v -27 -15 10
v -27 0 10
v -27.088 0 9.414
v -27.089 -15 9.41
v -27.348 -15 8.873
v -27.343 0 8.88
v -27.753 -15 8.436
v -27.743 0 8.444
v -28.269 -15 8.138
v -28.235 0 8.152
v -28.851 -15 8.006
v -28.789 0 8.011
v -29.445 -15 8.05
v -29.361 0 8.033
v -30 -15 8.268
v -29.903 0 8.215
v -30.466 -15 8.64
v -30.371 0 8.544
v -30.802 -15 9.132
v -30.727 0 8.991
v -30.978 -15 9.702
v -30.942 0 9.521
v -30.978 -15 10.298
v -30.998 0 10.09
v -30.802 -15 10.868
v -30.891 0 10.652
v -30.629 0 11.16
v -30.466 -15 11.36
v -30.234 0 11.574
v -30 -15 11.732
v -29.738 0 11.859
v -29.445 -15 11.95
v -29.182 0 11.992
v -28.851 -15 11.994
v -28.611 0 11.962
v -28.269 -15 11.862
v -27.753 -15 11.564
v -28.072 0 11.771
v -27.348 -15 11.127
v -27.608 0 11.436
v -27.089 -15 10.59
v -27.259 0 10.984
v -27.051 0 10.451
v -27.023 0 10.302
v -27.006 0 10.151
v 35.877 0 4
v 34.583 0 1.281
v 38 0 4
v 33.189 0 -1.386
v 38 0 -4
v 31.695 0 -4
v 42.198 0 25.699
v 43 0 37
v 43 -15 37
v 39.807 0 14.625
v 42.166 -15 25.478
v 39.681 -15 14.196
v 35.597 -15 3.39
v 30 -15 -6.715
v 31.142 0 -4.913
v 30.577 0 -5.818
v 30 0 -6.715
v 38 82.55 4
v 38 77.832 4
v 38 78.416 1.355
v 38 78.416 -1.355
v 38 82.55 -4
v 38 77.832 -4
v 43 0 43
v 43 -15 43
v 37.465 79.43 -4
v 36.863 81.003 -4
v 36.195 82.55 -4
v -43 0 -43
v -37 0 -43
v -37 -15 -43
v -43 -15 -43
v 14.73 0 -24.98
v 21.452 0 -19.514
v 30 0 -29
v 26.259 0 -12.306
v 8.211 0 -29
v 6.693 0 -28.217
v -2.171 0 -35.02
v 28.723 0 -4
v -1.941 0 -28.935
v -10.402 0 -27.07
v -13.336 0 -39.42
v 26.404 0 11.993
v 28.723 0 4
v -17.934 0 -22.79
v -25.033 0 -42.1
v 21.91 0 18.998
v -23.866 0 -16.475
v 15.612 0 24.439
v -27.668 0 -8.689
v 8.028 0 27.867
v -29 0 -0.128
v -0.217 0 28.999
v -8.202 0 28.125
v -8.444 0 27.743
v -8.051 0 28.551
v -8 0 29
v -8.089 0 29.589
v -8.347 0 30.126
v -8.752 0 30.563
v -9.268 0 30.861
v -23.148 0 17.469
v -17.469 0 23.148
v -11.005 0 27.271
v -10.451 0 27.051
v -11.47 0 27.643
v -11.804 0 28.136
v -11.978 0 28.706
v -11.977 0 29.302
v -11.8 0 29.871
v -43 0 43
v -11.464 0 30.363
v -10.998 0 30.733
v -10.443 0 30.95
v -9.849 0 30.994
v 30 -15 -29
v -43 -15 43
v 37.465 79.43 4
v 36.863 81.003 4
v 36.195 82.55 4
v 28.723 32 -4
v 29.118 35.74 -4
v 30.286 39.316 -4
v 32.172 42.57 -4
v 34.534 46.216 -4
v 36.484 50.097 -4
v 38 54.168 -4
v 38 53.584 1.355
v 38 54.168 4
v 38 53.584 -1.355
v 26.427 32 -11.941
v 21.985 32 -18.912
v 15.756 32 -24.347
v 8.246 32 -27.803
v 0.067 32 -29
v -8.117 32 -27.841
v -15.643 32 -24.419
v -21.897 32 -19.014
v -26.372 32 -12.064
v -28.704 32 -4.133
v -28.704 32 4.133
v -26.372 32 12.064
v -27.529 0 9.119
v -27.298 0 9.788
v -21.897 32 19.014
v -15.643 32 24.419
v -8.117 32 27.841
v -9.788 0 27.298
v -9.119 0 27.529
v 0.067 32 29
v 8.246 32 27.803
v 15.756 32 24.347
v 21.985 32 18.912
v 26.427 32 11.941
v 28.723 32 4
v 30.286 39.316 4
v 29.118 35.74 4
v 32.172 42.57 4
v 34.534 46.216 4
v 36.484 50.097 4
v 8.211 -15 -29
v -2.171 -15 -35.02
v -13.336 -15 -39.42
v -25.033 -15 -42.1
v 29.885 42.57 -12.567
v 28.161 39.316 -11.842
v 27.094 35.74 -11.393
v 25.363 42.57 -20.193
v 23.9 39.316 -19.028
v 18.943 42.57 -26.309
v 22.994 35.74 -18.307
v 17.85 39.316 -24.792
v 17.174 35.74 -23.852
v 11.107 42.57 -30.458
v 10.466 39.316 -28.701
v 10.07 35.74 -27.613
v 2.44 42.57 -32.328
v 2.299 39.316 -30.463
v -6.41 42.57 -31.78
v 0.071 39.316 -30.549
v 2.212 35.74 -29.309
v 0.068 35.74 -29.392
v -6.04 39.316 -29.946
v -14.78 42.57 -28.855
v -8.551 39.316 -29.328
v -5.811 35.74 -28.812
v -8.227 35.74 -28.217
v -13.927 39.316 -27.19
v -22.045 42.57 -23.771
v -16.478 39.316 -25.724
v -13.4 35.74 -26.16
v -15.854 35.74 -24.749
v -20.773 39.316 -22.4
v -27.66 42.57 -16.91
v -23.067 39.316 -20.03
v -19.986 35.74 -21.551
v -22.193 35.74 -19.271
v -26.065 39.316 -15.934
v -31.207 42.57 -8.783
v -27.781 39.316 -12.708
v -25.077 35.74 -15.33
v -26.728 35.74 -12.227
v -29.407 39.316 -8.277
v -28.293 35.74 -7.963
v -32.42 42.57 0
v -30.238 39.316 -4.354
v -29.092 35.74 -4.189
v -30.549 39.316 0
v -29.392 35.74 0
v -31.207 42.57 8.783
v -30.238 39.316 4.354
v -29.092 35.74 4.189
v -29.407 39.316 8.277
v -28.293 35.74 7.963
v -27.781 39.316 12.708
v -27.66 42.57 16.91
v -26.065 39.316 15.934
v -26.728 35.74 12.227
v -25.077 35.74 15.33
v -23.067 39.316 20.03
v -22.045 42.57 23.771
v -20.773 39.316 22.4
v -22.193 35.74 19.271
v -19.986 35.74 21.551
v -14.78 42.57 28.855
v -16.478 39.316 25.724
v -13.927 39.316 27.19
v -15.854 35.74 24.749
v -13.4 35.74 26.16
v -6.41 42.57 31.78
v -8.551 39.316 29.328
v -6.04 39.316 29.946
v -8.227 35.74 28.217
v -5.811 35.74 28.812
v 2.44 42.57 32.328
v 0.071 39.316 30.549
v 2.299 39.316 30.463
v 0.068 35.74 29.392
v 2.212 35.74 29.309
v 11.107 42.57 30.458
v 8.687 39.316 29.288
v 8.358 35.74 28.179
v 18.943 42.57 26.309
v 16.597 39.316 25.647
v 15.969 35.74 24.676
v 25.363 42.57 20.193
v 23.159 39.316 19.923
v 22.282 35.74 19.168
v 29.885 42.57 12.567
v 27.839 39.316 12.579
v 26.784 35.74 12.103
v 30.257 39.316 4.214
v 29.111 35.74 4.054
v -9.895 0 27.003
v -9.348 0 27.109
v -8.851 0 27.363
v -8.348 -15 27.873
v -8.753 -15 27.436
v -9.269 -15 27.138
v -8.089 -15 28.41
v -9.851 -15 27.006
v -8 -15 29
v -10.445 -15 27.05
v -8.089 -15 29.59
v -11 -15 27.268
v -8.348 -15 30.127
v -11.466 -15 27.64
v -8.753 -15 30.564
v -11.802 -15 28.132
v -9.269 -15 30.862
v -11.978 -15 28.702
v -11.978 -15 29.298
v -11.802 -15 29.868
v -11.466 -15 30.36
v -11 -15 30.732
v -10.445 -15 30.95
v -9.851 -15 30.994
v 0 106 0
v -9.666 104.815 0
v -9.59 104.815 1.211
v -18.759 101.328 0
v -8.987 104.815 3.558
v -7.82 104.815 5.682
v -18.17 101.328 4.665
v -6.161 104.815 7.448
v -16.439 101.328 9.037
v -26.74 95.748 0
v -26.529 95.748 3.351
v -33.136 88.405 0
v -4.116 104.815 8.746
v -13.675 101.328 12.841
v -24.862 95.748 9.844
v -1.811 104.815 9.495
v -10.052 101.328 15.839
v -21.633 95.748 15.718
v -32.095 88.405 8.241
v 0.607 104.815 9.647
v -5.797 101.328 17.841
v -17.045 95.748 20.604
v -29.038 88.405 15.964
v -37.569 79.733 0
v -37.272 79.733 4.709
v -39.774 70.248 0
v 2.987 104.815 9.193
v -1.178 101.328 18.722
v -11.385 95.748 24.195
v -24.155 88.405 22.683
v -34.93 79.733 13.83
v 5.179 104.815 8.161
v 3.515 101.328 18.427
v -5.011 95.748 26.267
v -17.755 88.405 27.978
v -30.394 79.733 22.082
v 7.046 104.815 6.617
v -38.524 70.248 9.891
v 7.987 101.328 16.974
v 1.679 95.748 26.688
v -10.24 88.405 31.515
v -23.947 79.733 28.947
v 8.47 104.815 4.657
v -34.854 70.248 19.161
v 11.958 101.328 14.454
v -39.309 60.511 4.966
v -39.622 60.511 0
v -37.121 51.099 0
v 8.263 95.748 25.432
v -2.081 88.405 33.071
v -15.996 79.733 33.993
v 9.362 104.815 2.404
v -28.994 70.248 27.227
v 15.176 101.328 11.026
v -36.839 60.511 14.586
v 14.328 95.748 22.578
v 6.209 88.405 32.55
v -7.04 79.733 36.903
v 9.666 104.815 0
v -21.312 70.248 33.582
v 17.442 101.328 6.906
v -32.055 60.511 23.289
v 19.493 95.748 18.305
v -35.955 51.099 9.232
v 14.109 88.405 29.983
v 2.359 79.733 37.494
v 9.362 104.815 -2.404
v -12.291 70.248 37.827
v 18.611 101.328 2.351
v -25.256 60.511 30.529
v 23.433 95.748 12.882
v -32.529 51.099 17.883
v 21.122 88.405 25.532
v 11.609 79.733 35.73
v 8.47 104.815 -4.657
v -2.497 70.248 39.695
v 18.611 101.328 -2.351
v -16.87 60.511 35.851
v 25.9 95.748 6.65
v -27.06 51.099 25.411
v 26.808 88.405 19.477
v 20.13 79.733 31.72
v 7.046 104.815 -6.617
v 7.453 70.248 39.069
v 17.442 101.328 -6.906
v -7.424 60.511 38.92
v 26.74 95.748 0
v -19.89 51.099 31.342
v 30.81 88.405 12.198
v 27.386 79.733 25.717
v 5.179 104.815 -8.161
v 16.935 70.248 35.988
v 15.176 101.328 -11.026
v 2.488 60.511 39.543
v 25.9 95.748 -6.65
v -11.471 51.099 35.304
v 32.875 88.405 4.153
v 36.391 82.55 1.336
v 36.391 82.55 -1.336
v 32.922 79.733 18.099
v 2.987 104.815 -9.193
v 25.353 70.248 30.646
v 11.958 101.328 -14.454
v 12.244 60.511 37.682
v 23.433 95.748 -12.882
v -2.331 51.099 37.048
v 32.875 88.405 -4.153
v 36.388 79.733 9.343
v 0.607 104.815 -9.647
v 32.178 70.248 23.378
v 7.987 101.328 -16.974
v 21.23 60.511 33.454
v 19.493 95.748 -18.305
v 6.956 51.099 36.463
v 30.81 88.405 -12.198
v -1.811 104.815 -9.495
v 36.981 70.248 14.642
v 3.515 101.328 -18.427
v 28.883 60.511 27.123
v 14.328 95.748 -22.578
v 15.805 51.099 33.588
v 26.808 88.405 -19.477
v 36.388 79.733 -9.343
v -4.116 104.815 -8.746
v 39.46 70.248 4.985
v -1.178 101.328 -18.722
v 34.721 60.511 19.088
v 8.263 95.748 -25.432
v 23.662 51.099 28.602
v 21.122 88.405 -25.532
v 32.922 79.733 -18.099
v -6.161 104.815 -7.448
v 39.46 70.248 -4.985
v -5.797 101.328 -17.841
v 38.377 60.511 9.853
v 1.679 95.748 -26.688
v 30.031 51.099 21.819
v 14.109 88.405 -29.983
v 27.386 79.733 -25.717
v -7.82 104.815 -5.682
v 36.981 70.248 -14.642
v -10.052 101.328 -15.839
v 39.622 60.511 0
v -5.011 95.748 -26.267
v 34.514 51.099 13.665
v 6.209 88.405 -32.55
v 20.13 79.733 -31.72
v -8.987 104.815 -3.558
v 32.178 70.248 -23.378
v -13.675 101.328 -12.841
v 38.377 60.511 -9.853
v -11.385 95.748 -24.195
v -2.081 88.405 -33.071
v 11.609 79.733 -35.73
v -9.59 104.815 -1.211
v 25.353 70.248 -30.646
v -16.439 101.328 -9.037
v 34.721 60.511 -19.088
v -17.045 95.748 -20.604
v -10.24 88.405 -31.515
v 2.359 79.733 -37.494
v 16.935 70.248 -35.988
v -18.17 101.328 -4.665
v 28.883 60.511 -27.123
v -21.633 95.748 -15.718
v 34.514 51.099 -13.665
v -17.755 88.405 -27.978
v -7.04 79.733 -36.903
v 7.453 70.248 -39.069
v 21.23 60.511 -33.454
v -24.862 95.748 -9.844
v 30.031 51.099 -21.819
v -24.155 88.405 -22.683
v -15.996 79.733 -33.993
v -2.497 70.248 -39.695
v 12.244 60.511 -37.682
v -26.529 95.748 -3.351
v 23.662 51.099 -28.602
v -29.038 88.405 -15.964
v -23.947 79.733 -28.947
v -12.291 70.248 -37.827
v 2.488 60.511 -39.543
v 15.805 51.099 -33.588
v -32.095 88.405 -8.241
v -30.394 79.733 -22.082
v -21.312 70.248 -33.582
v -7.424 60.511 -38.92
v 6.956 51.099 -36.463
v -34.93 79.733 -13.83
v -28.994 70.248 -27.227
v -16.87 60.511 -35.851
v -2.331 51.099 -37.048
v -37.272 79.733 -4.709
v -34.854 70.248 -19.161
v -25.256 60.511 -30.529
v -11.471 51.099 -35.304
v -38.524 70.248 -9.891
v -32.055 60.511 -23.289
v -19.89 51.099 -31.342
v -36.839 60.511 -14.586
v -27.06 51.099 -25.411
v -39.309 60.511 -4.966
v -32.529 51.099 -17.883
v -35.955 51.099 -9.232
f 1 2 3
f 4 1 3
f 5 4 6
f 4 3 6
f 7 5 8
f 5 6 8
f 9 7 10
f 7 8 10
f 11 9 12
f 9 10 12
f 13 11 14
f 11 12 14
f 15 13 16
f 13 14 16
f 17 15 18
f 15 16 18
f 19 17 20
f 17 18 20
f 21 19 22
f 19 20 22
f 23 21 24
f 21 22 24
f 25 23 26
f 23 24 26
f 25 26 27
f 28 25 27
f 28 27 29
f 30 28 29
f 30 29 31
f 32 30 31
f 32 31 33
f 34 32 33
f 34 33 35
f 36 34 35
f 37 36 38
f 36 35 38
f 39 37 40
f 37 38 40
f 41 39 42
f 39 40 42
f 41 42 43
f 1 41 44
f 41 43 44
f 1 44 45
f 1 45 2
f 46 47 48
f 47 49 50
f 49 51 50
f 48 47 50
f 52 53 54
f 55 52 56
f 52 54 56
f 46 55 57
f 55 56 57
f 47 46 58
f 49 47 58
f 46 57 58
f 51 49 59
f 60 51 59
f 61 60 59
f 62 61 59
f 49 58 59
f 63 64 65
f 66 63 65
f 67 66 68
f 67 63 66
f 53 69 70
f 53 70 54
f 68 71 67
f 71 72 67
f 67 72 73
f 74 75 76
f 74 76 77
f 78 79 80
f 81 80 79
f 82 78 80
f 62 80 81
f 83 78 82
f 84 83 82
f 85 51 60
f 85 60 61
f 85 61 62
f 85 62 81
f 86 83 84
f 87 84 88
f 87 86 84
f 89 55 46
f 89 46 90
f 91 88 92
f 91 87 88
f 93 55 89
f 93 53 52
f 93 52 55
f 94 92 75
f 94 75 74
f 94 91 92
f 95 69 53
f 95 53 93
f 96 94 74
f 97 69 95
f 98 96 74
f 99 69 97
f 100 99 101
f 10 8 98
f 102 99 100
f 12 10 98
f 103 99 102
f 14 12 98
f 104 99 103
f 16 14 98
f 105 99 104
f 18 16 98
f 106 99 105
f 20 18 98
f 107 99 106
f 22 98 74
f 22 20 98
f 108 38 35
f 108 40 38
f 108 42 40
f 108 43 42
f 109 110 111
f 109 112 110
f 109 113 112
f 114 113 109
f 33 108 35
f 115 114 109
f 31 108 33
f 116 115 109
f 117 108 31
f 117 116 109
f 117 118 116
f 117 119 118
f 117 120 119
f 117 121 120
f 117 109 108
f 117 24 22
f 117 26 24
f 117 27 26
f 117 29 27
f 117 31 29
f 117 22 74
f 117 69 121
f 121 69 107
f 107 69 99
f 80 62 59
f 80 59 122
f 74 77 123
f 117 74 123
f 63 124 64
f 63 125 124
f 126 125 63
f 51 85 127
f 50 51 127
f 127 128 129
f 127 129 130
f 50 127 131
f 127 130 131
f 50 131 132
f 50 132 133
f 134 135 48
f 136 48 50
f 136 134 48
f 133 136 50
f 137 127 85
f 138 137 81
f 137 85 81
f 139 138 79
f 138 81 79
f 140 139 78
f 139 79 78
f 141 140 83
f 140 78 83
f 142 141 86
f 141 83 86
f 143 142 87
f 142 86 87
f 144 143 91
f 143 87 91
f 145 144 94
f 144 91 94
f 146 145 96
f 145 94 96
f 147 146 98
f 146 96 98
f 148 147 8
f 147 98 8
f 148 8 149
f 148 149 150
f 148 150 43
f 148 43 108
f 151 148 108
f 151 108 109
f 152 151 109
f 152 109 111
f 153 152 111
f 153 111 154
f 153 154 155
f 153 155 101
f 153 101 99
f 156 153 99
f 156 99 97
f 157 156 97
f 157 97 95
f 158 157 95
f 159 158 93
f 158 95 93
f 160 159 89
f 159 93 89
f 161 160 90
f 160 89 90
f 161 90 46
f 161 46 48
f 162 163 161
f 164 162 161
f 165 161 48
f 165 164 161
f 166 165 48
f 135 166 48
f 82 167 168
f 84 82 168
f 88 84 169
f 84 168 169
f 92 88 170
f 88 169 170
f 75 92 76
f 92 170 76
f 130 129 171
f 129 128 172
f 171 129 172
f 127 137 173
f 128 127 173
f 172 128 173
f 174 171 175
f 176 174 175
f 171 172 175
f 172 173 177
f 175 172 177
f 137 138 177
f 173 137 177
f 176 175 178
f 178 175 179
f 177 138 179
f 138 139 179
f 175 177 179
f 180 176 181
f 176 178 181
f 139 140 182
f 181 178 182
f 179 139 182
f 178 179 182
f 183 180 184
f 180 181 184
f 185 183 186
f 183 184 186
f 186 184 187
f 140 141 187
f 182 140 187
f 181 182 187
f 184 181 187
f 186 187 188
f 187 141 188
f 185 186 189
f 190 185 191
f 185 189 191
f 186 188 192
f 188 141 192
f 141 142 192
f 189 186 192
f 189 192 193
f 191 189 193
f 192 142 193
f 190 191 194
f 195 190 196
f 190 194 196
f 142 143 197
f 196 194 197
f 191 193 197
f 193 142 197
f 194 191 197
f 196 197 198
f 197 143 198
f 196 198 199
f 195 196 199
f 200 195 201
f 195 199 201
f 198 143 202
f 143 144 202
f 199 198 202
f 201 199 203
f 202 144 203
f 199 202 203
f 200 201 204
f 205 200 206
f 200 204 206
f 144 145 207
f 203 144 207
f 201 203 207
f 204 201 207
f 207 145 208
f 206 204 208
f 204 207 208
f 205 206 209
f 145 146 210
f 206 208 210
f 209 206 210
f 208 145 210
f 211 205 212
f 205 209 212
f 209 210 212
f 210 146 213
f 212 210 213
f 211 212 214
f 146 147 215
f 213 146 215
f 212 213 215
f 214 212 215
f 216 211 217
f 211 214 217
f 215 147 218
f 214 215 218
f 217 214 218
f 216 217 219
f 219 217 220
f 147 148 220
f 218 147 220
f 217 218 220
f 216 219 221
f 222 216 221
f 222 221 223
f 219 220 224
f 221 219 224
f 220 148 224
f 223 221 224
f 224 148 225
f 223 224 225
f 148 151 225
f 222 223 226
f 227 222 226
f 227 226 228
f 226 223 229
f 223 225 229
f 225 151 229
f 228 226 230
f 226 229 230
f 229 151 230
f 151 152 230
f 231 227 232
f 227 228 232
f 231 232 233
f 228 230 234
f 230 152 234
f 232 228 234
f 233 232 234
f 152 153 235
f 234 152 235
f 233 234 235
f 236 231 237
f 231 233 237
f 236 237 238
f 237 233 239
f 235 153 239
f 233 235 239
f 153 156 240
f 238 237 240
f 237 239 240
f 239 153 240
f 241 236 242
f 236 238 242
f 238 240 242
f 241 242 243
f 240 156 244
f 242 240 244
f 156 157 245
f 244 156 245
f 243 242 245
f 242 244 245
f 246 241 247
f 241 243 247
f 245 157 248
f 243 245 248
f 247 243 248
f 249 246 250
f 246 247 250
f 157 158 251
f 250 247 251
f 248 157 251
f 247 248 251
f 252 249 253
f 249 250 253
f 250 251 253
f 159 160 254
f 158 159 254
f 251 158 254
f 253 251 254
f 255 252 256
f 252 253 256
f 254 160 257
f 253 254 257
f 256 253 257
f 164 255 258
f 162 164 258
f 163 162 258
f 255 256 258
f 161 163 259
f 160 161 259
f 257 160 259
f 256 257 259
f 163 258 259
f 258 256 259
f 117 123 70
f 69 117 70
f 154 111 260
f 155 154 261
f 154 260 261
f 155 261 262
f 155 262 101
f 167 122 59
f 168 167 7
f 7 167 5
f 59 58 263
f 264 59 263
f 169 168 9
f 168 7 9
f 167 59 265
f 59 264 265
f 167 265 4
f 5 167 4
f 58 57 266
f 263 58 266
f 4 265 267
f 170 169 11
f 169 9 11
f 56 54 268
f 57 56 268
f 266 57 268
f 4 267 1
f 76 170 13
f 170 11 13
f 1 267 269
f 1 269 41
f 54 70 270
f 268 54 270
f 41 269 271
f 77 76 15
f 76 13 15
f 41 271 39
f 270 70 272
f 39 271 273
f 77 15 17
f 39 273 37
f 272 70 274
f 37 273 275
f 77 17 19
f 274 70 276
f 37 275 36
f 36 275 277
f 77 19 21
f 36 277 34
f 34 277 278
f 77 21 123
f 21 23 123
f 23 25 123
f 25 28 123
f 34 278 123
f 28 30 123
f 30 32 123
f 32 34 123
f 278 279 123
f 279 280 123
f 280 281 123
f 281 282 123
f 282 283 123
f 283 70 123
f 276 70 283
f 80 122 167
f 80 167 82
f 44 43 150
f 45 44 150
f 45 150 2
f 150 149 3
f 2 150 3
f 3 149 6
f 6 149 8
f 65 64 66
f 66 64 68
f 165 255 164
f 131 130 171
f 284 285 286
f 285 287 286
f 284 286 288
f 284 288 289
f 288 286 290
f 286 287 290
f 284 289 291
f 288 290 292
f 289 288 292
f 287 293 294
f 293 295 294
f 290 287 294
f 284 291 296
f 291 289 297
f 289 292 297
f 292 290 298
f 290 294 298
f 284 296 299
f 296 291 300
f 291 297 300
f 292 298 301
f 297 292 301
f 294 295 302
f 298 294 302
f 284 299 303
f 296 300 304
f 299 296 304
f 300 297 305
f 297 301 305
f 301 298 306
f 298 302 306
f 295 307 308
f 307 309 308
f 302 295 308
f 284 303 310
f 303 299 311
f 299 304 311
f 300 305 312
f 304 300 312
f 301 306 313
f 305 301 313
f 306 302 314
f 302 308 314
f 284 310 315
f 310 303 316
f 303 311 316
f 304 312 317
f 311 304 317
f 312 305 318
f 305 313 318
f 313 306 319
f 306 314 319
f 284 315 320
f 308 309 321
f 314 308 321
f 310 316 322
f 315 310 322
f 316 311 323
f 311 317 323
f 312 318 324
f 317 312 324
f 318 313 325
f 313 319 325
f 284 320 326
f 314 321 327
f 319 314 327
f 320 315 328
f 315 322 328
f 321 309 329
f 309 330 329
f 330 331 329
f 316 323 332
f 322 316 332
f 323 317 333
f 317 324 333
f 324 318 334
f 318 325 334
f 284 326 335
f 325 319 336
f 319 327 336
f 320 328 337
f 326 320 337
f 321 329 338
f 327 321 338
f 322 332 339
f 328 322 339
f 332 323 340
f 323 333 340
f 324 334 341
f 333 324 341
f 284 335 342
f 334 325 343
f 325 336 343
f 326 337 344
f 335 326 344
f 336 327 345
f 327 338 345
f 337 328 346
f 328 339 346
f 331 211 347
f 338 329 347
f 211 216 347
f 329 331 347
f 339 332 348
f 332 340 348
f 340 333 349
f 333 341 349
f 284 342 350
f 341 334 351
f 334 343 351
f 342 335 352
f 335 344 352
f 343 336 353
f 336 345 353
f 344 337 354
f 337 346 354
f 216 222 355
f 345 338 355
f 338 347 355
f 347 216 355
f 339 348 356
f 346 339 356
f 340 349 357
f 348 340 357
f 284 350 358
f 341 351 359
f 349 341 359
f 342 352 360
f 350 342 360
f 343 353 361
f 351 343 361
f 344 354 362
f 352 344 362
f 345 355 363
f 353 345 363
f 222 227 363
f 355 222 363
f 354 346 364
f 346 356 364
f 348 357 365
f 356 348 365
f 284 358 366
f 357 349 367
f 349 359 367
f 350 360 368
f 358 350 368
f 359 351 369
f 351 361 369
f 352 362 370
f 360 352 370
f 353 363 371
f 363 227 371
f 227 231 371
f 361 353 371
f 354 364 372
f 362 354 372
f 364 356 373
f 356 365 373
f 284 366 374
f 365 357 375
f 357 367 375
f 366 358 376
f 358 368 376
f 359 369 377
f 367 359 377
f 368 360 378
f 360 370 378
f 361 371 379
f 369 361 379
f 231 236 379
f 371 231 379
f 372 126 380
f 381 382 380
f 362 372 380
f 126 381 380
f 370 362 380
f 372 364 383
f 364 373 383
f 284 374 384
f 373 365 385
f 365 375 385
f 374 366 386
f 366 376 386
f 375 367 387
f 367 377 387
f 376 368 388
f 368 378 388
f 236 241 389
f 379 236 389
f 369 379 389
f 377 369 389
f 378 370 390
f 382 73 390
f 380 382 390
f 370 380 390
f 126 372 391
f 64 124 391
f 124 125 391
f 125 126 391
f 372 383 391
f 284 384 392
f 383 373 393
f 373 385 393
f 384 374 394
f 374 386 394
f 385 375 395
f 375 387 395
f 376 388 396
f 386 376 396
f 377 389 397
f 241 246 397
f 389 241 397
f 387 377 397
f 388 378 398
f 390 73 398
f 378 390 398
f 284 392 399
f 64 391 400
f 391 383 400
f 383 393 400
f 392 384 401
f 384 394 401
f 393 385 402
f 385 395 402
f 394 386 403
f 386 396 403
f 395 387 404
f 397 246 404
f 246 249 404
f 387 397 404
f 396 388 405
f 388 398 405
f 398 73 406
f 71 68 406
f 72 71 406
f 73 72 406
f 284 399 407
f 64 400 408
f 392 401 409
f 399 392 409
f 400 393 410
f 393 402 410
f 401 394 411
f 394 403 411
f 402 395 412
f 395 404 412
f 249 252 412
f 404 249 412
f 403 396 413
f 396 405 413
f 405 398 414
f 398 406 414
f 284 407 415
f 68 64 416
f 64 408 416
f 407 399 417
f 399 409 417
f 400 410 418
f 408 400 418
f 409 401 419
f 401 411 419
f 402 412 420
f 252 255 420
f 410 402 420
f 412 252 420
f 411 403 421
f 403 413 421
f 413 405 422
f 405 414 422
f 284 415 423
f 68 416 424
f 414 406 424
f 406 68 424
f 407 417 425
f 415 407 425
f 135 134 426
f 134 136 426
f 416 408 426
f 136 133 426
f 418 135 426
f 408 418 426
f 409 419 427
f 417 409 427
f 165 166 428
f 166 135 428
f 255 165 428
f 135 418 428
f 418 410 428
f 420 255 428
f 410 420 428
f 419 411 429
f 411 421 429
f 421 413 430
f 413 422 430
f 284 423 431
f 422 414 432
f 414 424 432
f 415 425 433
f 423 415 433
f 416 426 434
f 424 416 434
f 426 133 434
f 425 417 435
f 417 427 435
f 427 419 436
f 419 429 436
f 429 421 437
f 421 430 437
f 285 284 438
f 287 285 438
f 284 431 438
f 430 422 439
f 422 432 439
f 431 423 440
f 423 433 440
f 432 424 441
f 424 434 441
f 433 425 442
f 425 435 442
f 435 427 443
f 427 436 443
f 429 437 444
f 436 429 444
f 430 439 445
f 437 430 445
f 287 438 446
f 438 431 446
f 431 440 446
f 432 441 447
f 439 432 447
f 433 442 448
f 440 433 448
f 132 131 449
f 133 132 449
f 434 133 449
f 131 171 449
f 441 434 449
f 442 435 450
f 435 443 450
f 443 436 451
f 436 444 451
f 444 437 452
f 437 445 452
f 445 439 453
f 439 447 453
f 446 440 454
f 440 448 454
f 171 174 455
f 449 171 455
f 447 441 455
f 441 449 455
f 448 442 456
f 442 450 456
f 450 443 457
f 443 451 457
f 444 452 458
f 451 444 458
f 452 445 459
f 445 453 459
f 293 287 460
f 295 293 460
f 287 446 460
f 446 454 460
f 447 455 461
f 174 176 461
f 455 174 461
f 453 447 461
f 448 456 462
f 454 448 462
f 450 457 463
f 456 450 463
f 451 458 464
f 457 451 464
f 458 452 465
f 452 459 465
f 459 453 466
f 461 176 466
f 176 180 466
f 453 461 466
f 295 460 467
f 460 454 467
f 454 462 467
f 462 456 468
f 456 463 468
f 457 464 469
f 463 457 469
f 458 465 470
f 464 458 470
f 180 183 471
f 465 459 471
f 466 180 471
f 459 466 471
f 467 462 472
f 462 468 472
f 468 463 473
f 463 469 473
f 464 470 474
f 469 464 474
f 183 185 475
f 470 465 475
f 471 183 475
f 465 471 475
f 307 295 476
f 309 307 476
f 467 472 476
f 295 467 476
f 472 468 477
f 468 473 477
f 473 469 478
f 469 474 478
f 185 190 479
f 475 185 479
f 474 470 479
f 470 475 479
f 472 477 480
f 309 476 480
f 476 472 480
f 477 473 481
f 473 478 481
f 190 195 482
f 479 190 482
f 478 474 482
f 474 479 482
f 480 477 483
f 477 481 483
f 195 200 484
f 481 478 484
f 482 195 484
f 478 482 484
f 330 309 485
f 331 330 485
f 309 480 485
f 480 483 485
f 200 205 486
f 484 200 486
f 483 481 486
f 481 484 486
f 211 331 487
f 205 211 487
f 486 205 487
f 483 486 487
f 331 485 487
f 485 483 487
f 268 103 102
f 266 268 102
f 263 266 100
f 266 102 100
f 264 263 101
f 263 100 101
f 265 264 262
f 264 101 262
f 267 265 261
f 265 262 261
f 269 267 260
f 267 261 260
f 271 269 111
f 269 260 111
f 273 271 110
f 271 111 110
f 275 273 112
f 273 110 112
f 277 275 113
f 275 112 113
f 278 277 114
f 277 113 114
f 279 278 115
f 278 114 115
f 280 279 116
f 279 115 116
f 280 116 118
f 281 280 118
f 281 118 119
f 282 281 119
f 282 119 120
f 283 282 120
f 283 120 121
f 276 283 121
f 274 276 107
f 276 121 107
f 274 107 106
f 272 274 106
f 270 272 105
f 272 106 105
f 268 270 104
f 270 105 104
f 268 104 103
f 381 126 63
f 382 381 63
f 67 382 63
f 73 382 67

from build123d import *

# Parameters (mm, degrees)
SKETCH1_R           = 29
BOSS_EXTRUDE1_DEPTH = 32
SKETCH3_W           = 8
SKETCH3_H           = 82.55
BOSS_EXTRUDE2_DEPTH = 38
SKETCH5_W           = 58
SKETCH5_H           = 15
BOSS_EXTRUDE3_DEPTH = 30
BOSS_EXTRUDE4_DEPTH = 15
SKETCH7_R           = 2
CUT_EXTRUDE2_DEPTH  = 16


with BuildPart() as part:
    # Sketch1 → Boss-Extrude1 (new body)
    with BuildSketch(Plane(origin=(0, 0, 0), x_dir=(1, 0, 0), z_dir=(0, 1, 0))):
        Circle(SKETCH1_R)
    extrude(amount=BOSS_EXTRUDE1_DEPTH)

    # Sketch2 → Revolve1 (revolve)
    with BuildSketch(Plane.XY):
        with BuildLine():
            Line((-29, 32), (0, 32))
            Line((0, 32), (0, 106))
            ThreePointArc((0, 106), (-35.617387288, 84.204442392), (-32.419733751, 42.570086139))
            ThreePointArc((-32.419733751, 42.570086139), (-29.876205733, 37.554756969), (-29, 32))
        make_face()
    revolve(axis=Axis((0, 32, 0), (0, 1, 0)))

    # Sketch3 → Boss-Extrude2 (add)
    with BuildSketch(Plane(origin=(0, 0, 0), x_dir=(0, 0, -1), z_dir=(1, 0, 0))):
        with Locations((0, 41.275)):
            Rectangle(SKETCH3_W, SKETCH3_H)
    extrude(amount=BOSS_EXTRUDE2_DEPTH)

    # Sketch5 → Boss-Extrude3 (add, symmetric)
    with BuildSketch(Plane(origin=(0, 0, 0), x_dir=(0, 0, -1), z_dir=(1, 0, 0))):
        with Locations((0, -7.5)):
            Rectangle(SKETCH5_W, SKETCH5_H)
    extrude(amount=BOSS_EXTRUDE3_DEPTH, both=True)

    # Sketch6 → Boss-Extrude4 (add)
    with BuildSketch(Plane.XZ.offset(15)):
        with BuildLine():
            Line((-37, -43), (-43, -43))
            Line((-43, -43), (-43, 43))
            Line((-43, 43), (43, 43))
            Line((43, 43), (43, 37))
            ThreePointArc((43, 37), (19.568542495, -19.568542495), (-37, -43))
        make_face()
    extrude(amount=-BOSS_EXTRUDE4_DEPTH)

    # Sketch7 → Cut-Extrude2 (cut, through all)
    with BuildSketch(Plane(origin=(0, 0, 0), x_dir=(1, 0, 0), z_dir=(0, 1, 0))):
        with Locations((-29, -10)):
            Circle(SKETCH7_R)
        with Locations((-10, -29)):
            Circle(SKETCH7_R)
    extrude(amount=-CUT_EXTRUDE2_DEPTH, mode=Mode.SUBTRACT)


solid = part.part
